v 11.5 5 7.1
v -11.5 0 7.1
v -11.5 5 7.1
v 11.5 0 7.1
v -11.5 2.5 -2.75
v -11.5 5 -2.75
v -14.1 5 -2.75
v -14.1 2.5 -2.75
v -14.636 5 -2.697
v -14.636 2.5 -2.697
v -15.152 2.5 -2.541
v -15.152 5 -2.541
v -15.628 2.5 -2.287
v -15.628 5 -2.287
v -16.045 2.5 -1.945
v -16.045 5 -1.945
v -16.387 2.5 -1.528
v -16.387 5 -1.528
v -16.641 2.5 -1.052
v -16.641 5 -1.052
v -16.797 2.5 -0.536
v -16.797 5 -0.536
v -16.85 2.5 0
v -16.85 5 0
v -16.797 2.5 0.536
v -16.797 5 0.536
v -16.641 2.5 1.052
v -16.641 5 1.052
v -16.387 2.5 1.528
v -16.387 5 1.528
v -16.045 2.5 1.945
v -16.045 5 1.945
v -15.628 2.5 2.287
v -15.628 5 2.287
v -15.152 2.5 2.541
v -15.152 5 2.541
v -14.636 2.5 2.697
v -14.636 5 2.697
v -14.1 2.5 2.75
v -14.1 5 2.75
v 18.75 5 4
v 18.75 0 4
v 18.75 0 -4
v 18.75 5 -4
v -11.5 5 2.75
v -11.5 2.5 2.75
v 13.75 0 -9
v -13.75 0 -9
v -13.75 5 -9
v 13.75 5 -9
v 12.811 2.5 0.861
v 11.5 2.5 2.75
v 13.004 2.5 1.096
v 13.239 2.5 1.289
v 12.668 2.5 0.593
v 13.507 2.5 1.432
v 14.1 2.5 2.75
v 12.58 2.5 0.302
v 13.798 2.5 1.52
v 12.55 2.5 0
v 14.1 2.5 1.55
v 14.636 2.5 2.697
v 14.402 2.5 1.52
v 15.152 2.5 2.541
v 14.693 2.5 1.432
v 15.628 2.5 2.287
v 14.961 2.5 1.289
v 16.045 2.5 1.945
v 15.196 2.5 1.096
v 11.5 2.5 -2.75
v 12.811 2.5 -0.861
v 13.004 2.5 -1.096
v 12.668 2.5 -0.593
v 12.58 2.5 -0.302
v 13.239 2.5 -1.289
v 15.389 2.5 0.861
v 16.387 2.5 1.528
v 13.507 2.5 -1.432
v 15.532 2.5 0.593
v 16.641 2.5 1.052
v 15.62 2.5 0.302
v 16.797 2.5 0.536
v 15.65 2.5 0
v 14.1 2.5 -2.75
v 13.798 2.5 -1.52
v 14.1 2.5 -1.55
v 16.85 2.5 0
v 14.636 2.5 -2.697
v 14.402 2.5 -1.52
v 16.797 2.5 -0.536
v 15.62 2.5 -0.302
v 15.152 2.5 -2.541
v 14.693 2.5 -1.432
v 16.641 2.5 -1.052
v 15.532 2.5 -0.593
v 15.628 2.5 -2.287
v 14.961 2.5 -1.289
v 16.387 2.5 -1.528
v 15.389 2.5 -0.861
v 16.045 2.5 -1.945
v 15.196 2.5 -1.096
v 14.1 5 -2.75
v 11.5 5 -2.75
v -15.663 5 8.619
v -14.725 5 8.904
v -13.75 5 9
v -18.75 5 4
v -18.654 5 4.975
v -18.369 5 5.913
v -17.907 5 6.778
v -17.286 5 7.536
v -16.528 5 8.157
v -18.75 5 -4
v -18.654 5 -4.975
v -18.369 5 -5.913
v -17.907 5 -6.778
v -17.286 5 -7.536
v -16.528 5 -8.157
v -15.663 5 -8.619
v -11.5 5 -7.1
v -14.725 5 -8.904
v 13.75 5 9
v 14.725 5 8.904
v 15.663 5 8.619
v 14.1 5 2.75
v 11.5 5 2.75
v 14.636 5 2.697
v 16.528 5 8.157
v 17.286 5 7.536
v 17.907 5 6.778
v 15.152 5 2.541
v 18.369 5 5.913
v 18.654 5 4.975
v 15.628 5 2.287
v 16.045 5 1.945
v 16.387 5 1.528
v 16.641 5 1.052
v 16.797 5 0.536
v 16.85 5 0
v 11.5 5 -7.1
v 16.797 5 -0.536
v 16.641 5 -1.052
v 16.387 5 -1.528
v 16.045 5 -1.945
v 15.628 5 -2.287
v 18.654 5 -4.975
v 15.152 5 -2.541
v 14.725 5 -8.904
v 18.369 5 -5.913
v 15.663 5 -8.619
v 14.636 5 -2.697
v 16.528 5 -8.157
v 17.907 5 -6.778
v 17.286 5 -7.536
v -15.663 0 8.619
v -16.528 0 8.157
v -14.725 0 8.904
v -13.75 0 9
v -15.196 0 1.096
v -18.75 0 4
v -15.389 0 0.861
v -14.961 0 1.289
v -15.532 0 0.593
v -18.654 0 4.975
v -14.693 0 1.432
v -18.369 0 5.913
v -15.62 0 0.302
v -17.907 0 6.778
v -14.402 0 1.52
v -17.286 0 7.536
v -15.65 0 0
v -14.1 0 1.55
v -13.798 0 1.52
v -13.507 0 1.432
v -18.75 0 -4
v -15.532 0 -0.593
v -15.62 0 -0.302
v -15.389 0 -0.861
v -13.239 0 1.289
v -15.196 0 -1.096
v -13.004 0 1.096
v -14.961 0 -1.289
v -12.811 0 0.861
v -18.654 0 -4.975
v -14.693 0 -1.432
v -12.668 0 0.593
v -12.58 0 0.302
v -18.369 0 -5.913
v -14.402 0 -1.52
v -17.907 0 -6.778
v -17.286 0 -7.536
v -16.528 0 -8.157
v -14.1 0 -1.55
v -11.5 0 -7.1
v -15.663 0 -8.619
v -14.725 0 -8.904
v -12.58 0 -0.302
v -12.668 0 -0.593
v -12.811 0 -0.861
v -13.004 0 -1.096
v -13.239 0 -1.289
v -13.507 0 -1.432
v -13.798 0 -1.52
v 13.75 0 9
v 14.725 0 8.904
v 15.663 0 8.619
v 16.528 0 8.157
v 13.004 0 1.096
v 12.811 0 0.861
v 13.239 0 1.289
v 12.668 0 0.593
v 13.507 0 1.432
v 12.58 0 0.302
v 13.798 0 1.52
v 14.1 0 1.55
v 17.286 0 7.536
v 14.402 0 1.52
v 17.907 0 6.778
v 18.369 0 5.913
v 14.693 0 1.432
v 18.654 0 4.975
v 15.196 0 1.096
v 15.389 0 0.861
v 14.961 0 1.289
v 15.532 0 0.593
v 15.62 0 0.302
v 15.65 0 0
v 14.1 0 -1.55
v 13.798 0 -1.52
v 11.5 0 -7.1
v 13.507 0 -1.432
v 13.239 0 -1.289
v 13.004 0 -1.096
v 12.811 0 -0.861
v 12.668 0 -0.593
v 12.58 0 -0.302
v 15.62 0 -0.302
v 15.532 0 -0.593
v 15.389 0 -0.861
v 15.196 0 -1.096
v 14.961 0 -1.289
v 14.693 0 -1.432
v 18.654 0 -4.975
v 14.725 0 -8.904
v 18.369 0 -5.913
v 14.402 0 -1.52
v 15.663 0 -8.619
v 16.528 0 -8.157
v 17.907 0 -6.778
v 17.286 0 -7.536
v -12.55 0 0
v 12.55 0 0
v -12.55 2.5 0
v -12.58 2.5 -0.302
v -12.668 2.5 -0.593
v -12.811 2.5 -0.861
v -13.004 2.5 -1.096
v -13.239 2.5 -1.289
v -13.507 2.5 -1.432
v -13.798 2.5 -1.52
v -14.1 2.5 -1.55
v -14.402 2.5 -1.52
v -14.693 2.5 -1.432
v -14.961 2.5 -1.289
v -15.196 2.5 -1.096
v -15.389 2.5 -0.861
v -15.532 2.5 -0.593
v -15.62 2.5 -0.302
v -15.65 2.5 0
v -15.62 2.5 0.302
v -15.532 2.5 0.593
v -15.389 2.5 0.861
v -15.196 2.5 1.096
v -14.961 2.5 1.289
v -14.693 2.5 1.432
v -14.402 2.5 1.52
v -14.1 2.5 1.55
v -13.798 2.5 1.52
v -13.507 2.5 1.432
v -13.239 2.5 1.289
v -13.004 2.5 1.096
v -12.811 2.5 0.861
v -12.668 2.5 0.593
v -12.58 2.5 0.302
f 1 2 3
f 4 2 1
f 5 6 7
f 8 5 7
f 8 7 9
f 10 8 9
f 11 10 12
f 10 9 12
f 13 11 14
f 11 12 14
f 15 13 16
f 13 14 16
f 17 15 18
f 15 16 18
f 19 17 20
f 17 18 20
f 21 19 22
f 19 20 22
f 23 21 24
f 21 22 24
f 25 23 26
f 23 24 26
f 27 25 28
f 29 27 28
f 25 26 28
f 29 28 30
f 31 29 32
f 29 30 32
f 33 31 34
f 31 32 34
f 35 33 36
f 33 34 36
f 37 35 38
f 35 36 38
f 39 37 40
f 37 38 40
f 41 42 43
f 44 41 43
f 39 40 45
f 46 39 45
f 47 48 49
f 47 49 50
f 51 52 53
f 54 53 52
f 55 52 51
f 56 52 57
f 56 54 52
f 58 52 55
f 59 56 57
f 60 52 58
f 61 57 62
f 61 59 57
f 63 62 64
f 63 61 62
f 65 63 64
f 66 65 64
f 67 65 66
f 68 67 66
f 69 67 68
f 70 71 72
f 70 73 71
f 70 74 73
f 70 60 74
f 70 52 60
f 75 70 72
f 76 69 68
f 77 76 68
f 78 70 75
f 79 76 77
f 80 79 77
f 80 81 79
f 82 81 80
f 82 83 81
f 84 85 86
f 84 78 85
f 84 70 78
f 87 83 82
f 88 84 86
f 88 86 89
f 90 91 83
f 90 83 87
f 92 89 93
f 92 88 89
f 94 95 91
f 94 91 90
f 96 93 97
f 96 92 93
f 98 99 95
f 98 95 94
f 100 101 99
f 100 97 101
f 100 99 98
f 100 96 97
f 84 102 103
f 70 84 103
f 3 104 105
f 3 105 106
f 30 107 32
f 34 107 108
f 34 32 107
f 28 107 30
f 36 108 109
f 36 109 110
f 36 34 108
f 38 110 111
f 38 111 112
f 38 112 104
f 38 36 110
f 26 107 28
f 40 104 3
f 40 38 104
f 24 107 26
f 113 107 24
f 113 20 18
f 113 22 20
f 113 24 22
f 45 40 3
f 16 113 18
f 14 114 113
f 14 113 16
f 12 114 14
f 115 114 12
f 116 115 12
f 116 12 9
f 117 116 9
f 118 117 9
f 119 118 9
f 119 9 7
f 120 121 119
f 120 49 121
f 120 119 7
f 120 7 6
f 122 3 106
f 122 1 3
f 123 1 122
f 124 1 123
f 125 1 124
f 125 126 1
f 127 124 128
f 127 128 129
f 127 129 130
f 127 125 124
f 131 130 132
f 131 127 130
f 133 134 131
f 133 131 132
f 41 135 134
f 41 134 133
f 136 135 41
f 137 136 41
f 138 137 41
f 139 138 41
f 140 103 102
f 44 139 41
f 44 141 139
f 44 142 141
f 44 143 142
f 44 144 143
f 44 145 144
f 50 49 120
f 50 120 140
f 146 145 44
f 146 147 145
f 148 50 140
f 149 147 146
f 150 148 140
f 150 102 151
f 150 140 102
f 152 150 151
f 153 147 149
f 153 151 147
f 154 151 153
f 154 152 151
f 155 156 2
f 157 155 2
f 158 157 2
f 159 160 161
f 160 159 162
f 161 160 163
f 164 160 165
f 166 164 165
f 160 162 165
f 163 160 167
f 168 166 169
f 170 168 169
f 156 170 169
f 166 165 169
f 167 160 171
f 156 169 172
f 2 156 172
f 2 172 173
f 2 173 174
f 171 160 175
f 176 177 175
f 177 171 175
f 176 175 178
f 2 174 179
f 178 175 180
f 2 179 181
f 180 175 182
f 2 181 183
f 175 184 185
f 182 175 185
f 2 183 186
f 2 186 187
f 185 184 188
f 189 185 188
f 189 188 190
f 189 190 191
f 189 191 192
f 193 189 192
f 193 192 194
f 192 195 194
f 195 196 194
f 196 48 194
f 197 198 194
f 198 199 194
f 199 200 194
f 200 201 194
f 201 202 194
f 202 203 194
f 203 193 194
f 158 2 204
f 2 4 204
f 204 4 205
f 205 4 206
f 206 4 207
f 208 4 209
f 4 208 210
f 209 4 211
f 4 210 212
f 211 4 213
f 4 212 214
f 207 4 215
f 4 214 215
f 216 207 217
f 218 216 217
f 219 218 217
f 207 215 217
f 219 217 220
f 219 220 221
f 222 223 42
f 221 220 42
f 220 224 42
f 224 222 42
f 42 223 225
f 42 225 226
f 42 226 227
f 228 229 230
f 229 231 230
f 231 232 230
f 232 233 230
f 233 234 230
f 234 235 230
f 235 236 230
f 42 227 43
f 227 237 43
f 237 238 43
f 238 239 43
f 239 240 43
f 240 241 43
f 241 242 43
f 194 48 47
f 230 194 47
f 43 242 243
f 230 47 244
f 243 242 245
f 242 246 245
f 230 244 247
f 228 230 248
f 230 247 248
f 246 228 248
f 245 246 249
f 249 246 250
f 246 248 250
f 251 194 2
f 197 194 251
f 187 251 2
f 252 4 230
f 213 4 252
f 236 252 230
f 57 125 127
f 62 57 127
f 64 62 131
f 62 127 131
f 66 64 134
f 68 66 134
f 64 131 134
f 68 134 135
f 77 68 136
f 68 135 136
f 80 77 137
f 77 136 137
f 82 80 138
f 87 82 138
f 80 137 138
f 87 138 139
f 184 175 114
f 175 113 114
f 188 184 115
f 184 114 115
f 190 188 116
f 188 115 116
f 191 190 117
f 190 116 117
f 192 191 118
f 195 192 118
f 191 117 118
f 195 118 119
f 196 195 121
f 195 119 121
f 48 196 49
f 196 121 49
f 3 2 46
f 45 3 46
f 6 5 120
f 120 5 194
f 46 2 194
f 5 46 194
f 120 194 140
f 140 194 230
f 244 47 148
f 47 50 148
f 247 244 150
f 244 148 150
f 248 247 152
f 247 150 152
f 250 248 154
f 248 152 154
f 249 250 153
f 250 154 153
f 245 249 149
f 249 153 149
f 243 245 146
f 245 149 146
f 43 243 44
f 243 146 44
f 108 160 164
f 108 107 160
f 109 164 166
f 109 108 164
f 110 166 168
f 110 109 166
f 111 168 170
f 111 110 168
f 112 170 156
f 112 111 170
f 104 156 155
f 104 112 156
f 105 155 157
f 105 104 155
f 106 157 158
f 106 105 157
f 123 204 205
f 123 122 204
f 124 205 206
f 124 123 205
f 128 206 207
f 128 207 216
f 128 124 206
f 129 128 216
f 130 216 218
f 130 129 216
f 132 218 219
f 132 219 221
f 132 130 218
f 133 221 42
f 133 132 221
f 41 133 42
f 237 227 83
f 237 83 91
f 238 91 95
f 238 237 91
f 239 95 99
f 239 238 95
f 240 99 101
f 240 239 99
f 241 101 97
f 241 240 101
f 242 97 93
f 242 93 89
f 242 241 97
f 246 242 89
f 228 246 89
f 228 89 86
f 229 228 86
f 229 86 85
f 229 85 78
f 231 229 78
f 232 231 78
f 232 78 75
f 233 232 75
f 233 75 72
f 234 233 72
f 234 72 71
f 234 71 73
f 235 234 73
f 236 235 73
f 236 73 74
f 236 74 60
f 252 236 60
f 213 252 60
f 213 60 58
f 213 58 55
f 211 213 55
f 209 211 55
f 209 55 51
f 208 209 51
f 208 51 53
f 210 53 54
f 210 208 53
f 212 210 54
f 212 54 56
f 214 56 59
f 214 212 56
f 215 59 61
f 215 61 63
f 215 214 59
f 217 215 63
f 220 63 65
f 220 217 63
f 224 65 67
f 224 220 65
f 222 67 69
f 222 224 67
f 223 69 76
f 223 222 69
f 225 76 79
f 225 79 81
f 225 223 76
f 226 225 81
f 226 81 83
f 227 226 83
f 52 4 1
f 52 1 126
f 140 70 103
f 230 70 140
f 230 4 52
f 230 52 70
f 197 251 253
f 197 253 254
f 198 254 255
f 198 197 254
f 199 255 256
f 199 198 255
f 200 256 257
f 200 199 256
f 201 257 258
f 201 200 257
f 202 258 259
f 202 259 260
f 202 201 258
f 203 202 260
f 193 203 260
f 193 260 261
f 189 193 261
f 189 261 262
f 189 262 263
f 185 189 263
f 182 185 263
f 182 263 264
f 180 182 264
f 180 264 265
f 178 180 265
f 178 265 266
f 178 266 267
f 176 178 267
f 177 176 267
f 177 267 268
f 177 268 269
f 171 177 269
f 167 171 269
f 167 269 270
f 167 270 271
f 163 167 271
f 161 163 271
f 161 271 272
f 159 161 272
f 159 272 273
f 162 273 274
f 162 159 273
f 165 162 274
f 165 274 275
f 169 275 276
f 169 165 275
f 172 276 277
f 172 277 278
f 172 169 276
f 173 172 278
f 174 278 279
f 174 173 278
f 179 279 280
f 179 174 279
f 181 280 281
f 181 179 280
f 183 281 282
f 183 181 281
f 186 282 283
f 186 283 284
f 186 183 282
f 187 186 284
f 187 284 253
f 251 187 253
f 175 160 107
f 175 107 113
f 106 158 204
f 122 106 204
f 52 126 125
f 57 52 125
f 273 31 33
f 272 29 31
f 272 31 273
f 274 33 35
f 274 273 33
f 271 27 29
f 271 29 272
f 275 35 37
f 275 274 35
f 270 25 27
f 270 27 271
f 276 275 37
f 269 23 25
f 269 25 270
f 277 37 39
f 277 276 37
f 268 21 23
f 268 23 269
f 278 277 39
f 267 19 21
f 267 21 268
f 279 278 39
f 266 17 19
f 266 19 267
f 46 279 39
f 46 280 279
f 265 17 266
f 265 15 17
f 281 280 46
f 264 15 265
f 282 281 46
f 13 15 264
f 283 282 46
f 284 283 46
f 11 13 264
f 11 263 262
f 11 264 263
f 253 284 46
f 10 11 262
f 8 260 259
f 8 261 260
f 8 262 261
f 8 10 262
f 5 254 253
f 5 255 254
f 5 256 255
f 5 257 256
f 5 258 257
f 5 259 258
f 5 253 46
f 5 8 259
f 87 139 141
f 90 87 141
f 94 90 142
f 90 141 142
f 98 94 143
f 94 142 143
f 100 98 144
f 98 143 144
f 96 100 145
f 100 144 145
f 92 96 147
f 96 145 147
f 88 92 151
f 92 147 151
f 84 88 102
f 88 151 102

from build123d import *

# Parameters (mm, degrees)
SKETCH1_W           = 37.5
SKETCH1_H           = 18
SKETCH1_R           = 1.55
SKETCH1_W_2         = 23
SKETCH1_H_2         = 14.2
BOSS_EXTRUDE1_DEPTH = 5
SKETCH2_R           = 1.55
CUT_EXTRUDE1_DEPTH  = 2.5
FILLET1_R           = 5


with BuildPart() as part:
    # Sketch1 → Boss-Extrude1 (new body)
    with BuildSketch(Plane(origin=(0, 0, 0), x_dir=(1, 0, 0), z_dir=(0, 1, 0))):
        Rectangle(SKETCH1_W, SKETCH1_H)
        with Locations((-14.1, 0)):
            Circle(SKETCH1_R, mode=Mode.SUBTRACT)
        with Locations((14.1, 0)):
            Circle(SKETCH1_R, mode=Mode.SUBTRACT)
        Rectangle(SKETCH1_W_2, SKETCH1_H_2, mode=Mode.SUBTRACT)
    extrude(amount=BOSS_EXTRUDE1_DEPTH)

    # Sketch2 → Cut-Extrude1 (cut)
    with BuildSketch(Plane(origin=(0, 5, 0), x_dir=(1, 0, 0), z_dir=(0, 1, 0))):
        with BuildLine():
            ThreePointArc((11.5, 0.895823643), (12.503286973, 2.238974656), (14.1, 2.75))
            Line((14.1, 2.75), (11.5, 2.75))
            Line((11.5, 2.75), (11.5, 0.895823643))
        make_face()
        with BuildLine():
            Line((11.5, -2.75), (14.1, -2.75))
            ThreePointArc((14.1, -2.75), (12.503286973, -2.238974656), (11.5, -0.895823643))
            Line((11.5, -0.895823643), (11.5, -2.75))
        make_face()
        with BuildLine():
            ThreePointArc((16.85, 0), (16.044543648, 1.944543648), (14.1, 2.75))
            ThreePointArc((14.1, 2.75), (12.503286973, 2.238974656), (11.5, 0.895823643))
            Line((11.5, 0.895823643), (11.5, -0.895823643))
            ThreePointArc((11.5, -0.895823643), (12.503286973, -2.238974656), (14.1, -2.75))
            ThreePointArc((14.1, -2.75), (16.044543648, -1.944543648), (16.85, 0))
        make_face()
        with Locations((14.1, 0)):
            Circle(SKETCH2_R, mode=Mode.SUBTRACT)
        with BuildLine():
            ThreePointArc((-11.5, -0.895823643), (-12.503286973, -2.238974656), (-14.1, -2.75))
            Line((-14.1, -2.75), (-11.5, -2.75))
            Line((-11.5, -2.75), (-11.5, -0.895823643))
        make_face()
        with BuildLine():
            Line((-11.5, 2.75), (-14.1, 2.75))
            ThreePointArc((-14.1, 2.75), (-12.503286973, 2.238974656), (-11.5, 0.895823643))
            Line((-11.5, 0.895823643), (-11.5, 2.75))
        make_face()
        with BuildLine():
            ThreePointArc((-11.5, 0.895823643), (-12.503286973, 2.238974656), (-14.1, 2.75))
            ThreePointArc((-14.1, 2.75), (-16.85, 0), (-14.1, -2.75))
            ThreePointArc((-14.1, -2.75), (-12.503286973, -2.238974656), (-11.5, -0.895823643))
            Line((-11.5, -0.895823643), (-11.5, 0.895823643))
        make_face()
        with Locations((-14.1, 0)):
            Circle(SKETCH2_R, mode=Mode.SUBTRACT)
    extrude(amount=-CUT_EXTRUDE1_DEPTH, mode=Mode.SUBTRACT)

    # Fillet1
    fillet1_edges = [part.edges().sort_by_distance(p)[0] for p in [
        (18.75, 2.5, 9),
        (-18.75, 2.5, 9),
        (-18.75, 2.5, -9),
        (18.75, 2.5, -9),
    ]]
    fillet(fillet1_edges, radius=FILLET1_R)


solid = part.part
